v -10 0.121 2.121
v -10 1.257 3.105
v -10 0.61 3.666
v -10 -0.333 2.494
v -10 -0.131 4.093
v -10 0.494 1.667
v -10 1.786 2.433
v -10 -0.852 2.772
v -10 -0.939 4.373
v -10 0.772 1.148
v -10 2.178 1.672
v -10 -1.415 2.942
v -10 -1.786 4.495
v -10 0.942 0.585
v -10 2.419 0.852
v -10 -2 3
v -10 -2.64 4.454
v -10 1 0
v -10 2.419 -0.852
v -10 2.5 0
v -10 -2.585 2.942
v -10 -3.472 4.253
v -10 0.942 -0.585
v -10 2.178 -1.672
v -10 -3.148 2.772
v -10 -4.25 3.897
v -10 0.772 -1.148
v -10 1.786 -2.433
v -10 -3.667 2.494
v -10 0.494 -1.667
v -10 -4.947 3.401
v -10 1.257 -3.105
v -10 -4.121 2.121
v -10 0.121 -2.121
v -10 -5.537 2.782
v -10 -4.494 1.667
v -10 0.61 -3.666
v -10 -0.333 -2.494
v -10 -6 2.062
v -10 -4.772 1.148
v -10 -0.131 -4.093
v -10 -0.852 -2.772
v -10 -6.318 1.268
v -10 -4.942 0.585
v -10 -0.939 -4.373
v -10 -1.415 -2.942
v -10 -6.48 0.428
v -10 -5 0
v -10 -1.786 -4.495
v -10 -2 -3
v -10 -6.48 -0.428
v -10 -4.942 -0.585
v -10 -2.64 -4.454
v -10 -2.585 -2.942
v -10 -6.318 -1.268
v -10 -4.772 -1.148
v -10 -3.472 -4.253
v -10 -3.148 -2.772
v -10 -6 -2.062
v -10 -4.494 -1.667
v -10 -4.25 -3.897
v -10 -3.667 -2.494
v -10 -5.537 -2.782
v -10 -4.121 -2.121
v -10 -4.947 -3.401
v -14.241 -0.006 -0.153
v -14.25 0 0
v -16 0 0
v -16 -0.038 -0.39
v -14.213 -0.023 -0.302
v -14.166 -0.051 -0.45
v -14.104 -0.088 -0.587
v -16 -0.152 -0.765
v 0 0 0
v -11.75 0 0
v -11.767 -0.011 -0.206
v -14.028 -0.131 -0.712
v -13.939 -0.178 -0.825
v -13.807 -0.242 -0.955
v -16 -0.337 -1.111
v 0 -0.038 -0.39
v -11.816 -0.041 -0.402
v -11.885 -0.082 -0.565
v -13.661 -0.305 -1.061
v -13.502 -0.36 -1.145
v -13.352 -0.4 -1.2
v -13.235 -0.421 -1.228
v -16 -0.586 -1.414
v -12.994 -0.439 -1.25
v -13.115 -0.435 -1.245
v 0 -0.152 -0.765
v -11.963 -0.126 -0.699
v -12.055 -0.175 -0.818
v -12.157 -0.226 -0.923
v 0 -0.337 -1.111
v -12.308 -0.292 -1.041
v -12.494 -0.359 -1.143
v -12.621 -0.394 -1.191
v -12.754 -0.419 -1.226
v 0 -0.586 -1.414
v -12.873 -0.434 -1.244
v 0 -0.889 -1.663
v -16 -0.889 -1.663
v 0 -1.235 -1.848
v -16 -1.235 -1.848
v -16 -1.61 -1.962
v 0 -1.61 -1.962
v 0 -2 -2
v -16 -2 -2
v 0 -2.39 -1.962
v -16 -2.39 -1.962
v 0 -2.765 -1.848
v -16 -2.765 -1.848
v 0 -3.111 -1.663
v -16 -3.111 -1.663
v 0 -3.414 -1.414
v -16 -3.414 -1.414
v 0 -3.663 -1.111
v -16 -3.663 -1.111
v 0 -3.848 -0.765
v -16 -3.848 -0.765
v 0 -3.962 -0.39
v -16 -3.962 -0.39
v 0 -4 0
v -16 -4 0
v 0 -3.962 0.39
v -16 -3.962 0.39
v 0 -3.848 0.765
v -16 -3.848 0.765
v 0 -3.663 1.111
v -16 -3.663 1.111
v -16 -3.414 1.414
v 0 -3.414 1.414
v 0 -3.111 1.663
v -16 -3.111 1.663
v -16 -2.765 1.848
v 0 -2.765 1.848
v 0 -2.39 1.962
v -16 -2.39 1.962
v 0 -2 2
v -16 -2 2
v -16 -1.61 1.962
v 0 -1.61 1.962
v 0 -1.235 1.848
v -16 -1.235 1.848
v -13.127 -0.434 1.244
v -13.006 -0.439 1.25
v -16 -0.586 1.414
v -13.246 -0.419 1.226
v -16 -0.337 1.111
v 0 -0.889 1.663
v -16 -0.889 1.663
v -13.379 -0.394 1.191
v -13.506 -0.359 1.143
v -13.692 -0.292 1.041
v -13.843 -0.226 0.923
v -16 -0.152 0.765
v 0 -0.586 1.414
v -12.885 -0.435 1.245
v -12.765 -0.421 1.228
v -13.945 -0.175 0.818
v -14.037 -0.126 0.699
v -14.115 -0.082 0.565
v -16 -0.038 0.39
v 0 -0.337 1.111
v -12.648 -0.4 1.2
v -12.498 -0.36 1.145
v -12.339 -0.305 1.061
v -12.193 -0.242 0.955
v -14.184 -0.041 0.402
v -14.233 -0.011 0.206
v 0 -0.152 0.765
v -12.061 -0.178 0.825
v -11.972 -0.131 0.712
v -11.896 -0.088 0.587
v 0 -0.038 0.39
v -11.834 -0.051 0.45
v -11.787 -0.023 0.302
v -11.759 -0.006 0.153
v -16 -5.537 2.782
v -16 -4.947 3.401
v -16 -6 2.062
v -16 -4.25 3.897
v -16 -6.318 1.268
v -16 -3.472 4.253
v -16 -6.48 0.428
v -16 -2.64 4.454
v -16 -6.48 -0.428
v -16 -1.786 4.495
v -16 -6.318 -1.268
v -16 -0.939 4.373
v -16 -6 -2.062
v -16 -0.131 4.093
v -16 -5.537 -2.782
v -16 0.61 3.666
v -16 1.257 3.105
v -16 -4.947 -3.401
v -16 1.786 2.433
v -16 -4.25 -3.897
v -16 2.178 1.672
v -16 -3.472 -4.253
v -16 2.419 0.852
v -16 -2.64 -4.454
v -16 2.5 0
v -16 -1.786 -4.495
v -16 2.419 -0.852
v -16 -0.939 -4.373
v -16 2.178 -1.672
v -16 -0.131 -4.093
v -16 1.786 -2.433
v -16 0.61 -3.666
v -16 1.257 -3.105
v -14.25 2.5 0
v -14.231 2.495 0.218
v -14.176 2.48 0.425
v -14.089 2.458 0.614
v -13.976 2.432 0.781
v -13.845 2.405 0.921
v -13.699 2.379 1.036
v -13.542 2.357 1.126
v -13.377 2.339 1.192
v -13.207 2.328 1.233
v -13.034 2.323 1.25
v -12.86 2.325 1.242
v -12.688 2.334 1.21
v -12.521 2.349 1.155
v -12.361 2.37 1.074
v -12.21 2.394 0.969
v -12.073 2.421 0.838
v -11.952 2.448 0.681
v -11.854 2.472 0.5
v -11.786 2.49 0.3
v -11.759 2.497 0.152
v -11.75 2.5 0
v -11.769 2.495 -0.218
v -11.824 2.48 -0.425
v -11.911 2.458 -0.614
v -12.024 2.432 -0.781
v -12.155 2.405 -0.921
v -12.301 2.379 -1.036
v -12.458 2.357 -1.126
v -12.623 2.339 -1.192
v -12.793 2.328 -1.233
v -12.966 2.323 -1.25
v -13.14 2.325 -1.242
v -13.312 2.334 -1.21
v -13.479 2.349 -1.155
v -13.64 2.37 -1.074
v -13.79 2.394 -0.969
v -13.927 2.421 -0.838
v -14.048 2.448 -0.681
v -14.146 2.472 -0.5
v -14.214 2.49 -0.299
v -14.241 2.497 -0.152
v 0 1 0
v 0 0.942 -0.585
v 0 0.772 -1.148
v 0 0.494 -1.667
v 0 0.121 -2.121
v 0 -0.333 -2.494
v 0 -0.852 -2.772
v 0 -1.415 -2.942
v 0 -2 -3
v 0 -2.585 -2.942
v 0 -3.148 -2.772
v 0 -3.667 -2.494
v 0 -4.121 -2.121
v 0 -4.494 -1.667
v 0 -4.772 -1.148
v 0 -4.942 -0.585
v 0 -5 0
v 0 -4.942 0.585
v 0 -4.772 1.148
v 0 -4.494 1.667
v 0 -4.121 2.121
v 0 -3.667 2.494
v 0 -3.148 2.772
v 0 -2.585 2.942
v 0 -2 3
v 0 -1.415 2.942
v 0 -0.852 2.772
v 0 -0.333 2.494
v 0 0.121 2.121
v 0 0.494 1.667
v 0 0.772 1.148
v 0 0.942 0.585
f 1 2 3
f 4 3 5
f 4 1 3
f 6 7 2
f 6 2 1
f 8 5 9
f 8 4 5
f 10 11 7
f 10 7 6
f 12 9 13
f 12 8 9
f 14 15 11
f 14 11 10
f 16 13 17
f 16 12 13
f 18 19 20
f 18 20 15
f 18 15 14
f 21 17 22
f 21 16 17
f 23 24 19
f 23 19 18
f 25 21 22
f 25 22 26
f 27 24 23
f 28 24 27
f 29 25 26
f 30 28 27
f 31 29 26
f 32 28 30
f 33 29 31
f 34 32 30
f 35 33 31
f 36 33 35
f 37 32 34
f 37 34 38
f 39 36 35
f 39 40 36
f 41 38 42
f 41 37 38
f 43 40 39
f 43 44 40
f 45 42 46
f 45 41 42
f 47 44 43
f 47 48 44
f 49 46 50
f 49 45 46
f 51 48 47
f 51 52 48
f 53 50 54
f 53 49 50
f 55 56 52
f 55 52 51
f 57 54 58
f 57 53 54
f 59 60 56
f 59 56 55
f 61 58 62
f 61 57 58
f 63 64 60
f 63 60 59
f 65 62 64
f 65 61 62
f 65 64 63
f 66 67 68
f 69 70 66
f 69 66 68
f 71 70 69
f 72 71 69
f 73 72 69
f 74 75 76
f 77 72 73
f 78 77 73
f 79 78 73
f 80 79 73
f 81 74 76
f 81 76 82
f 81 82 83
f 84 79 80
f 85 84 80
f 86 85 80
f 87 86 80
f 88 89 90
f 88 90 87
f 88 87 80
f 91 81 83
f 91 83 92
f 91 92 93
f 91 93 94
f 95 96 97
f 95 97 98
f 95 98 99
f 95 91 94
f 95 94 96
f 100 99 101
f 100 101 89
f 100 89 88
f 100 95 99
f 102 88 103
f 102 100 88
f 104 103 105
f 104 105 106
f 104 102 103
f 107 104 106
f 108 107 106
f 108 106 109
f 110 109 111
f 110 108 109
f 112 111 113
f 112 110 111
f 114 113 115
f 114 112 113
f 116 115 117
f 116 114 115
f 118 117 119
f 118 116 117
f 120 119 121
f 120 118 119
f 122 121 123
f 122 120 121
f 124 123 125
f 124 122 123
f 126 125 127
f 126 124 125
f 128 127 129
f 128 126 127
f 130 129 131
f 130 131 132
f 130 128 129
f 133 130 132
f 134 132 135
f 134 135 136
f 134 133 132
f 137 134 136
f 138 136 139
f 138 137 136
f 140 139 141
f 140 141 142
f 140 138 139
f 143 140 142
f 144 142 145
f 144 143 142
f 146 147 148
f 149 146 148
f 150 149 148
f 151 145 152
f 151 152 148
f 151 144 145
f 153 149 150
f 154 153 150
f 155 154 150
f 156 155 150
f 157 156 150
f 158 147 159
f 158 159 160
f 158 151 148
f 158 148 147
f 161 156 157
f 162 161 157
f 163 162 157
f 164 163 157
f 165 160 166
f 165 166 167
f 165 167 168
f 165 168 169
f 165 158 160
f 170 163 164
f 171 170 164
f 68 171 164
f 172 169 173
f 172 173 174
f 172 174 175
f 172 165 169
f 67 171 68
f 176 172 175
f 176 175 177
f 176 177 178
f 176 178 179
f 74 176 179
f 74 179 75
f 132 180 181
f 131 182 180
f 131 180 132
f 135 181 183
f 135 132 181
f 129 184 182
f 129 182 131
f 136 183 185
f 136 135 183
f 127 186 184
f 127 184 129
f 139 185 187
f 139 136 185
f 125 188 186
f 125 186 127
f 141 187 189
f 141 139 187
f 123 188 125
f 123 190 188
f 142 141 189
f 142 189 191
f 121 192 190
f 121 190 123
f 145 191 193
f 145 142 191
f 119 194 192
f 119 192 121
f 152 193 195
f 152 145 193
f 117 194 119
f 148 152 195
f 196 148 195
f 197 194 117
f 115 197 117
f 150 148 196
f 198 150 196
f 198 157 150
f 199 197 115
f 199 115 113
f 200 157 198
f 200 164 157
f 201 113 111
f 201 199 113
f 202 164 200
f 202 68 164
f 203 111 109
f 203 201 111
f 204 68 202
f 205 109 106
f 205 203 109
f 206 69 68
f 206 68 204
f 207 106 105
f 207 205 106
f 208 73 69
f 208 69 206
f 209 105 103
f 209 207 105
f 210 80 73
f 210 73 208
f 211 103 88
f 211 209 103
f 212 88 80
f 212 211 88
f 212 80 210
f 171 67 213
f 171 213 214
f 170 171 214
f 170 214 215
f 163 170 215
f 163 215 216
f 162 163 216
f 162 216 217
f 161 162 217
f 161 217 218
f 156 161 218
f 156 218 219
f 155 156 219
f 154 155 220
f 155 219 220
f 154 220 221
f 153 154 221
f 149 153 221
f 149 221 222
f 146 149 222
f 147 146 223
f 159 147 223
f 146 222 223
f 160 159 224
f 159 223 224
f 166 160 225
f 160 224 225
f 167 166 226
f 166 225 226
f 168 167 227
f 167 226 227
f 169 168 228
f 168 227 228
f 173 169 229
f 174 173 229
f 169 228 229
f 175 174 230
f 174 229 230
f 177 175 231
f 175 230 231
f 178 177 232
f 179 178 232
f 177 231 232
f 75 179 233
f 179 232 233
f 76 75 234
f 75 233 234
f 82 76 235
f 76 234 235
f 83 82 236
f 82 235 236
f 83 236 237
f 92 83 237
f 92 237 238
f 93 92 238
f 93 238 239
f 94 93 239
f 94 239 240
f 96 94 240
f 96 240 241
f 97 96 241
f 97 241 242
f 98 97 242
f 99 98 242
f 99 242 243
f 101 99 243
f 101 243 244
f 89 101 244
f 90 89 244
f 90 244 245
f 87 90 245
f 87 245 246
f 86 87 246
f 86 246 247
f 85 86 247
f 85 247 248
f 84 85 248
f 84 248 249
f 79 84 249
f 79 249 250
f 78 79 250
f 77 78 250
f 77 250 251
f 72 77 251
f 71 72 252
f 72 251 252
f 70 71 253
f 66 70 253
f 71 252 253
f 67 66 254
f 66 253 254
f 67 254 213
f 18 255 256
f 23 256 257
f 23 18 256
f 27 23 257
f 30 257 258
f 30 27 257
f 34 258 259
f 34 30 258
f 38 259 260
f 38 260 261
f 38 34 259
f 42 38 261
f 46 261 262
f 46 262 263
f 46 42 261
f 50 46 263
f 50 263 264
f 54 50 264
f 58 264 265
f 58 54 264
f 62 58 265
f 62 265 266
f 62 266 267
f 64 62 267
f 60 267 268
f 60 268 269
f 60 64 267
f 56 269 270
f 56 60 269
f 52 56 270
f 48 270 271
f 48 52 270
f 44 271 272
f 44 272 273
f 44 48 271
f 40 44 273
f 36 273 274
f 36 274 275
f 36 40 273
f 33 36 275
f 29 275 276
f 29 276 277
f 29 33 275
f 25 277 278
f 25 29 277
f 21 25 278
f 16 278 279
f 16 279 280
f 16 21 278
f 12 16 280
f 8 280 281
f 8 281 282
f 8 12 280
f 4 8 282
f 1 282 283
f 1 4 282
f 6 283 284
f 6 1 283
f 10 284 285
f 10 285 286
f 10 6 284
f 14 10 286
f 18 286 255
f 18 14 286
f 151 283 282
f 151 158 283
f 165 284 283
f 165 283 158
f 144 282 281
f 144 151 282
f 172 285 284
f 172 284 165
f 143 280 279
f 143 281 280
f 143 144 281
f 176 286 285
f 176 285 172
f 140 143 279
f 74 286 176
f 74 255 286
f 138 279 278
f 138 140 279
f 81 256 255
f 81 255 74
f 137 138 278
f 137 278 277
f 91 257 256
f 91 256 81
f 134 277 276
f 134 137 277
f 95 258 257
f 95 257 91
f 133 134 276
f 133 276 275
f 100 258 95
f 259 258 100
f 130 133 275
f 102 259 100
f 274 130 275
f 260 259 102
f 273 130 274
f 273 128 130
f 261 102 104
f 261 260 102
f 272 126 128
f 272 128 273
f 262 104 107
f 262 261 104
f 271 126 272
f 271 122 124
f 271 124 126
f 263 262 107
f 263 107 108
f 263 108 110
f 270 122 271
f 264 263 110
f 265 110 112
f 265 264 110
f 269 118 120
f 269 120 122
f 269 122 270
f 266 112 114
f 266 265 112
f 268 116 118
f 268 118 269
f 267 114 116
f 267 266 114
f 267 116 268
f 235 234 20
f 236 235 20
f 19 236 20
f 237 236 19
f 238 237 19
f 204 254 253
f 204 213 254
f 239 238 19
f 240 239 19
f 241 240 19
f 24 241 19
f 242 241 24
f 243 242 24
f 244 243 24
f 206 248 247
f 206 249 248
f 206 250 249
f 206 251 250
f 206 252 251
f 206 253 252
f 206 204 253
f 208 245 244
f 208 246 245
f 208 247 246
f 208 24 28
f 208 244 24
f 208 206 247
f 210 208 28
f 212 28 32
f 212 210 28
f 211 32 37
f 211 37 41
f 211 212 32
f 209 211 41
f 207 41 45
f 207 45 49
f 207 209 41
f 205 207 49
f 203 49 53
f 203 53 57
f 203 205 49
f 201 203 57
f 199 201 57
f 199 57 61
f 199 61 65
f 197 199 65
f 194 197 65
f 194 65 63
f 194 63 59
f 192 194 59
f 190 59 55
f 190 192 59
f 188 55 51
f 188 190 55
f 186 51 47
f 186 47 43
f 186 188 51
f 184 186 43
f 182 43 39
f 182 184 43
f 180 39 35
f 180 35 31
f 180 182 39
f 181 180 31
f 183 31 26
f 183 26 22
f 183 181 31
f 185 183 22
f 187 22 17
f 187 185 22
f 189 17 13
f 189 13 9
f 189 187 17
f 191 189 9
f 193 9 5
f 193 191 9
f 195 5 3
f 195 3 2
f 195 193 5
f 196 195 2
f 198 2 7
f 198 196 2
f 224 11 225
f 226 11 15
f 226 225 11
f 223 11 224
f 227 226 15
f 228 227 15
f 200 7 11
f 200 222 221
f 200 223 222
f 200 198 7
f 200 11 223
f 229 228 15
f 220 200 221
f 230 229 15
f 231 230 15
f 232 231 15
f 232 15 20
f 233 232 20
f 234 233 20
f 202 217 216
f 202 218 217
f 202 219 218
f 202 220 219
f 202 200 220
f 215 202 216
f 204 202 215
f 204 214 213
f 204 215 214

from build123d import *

# Parameters (mm, degrees)
ESQUISSE3_R             = 1.25
ENL_V_MAT_EXTRU_1_DEPTH = 6


with BuildPart() as part:
    # Esquisse1 → Révolution1 (revolve)
    with BuildSketch(Plane.XY):
        Polygon((0, 0), (0, 1), (-10, 1), (-10, 2.5), (-16, 2.5), (-16, 0), align=None)
    revolve(axis=Axis((0, -2, 0), (-1, 0, 0)))

    # Esquisse3 → Enlèv. mat.-Extru.1 (cut)
    with BuildSketch(Plane(origin=(0, 3, 0), x_dir=(-1, 0, 0), z_dir=(0, 1, 0))):
        with Locations((13, 0)):
            Circle(ESQUISSE3_R)
    extrude(amount=-ENL_V_MAT_EXTRU_1_DEPTH, mode=Mode.SUBTRACT)


solid = part.part
